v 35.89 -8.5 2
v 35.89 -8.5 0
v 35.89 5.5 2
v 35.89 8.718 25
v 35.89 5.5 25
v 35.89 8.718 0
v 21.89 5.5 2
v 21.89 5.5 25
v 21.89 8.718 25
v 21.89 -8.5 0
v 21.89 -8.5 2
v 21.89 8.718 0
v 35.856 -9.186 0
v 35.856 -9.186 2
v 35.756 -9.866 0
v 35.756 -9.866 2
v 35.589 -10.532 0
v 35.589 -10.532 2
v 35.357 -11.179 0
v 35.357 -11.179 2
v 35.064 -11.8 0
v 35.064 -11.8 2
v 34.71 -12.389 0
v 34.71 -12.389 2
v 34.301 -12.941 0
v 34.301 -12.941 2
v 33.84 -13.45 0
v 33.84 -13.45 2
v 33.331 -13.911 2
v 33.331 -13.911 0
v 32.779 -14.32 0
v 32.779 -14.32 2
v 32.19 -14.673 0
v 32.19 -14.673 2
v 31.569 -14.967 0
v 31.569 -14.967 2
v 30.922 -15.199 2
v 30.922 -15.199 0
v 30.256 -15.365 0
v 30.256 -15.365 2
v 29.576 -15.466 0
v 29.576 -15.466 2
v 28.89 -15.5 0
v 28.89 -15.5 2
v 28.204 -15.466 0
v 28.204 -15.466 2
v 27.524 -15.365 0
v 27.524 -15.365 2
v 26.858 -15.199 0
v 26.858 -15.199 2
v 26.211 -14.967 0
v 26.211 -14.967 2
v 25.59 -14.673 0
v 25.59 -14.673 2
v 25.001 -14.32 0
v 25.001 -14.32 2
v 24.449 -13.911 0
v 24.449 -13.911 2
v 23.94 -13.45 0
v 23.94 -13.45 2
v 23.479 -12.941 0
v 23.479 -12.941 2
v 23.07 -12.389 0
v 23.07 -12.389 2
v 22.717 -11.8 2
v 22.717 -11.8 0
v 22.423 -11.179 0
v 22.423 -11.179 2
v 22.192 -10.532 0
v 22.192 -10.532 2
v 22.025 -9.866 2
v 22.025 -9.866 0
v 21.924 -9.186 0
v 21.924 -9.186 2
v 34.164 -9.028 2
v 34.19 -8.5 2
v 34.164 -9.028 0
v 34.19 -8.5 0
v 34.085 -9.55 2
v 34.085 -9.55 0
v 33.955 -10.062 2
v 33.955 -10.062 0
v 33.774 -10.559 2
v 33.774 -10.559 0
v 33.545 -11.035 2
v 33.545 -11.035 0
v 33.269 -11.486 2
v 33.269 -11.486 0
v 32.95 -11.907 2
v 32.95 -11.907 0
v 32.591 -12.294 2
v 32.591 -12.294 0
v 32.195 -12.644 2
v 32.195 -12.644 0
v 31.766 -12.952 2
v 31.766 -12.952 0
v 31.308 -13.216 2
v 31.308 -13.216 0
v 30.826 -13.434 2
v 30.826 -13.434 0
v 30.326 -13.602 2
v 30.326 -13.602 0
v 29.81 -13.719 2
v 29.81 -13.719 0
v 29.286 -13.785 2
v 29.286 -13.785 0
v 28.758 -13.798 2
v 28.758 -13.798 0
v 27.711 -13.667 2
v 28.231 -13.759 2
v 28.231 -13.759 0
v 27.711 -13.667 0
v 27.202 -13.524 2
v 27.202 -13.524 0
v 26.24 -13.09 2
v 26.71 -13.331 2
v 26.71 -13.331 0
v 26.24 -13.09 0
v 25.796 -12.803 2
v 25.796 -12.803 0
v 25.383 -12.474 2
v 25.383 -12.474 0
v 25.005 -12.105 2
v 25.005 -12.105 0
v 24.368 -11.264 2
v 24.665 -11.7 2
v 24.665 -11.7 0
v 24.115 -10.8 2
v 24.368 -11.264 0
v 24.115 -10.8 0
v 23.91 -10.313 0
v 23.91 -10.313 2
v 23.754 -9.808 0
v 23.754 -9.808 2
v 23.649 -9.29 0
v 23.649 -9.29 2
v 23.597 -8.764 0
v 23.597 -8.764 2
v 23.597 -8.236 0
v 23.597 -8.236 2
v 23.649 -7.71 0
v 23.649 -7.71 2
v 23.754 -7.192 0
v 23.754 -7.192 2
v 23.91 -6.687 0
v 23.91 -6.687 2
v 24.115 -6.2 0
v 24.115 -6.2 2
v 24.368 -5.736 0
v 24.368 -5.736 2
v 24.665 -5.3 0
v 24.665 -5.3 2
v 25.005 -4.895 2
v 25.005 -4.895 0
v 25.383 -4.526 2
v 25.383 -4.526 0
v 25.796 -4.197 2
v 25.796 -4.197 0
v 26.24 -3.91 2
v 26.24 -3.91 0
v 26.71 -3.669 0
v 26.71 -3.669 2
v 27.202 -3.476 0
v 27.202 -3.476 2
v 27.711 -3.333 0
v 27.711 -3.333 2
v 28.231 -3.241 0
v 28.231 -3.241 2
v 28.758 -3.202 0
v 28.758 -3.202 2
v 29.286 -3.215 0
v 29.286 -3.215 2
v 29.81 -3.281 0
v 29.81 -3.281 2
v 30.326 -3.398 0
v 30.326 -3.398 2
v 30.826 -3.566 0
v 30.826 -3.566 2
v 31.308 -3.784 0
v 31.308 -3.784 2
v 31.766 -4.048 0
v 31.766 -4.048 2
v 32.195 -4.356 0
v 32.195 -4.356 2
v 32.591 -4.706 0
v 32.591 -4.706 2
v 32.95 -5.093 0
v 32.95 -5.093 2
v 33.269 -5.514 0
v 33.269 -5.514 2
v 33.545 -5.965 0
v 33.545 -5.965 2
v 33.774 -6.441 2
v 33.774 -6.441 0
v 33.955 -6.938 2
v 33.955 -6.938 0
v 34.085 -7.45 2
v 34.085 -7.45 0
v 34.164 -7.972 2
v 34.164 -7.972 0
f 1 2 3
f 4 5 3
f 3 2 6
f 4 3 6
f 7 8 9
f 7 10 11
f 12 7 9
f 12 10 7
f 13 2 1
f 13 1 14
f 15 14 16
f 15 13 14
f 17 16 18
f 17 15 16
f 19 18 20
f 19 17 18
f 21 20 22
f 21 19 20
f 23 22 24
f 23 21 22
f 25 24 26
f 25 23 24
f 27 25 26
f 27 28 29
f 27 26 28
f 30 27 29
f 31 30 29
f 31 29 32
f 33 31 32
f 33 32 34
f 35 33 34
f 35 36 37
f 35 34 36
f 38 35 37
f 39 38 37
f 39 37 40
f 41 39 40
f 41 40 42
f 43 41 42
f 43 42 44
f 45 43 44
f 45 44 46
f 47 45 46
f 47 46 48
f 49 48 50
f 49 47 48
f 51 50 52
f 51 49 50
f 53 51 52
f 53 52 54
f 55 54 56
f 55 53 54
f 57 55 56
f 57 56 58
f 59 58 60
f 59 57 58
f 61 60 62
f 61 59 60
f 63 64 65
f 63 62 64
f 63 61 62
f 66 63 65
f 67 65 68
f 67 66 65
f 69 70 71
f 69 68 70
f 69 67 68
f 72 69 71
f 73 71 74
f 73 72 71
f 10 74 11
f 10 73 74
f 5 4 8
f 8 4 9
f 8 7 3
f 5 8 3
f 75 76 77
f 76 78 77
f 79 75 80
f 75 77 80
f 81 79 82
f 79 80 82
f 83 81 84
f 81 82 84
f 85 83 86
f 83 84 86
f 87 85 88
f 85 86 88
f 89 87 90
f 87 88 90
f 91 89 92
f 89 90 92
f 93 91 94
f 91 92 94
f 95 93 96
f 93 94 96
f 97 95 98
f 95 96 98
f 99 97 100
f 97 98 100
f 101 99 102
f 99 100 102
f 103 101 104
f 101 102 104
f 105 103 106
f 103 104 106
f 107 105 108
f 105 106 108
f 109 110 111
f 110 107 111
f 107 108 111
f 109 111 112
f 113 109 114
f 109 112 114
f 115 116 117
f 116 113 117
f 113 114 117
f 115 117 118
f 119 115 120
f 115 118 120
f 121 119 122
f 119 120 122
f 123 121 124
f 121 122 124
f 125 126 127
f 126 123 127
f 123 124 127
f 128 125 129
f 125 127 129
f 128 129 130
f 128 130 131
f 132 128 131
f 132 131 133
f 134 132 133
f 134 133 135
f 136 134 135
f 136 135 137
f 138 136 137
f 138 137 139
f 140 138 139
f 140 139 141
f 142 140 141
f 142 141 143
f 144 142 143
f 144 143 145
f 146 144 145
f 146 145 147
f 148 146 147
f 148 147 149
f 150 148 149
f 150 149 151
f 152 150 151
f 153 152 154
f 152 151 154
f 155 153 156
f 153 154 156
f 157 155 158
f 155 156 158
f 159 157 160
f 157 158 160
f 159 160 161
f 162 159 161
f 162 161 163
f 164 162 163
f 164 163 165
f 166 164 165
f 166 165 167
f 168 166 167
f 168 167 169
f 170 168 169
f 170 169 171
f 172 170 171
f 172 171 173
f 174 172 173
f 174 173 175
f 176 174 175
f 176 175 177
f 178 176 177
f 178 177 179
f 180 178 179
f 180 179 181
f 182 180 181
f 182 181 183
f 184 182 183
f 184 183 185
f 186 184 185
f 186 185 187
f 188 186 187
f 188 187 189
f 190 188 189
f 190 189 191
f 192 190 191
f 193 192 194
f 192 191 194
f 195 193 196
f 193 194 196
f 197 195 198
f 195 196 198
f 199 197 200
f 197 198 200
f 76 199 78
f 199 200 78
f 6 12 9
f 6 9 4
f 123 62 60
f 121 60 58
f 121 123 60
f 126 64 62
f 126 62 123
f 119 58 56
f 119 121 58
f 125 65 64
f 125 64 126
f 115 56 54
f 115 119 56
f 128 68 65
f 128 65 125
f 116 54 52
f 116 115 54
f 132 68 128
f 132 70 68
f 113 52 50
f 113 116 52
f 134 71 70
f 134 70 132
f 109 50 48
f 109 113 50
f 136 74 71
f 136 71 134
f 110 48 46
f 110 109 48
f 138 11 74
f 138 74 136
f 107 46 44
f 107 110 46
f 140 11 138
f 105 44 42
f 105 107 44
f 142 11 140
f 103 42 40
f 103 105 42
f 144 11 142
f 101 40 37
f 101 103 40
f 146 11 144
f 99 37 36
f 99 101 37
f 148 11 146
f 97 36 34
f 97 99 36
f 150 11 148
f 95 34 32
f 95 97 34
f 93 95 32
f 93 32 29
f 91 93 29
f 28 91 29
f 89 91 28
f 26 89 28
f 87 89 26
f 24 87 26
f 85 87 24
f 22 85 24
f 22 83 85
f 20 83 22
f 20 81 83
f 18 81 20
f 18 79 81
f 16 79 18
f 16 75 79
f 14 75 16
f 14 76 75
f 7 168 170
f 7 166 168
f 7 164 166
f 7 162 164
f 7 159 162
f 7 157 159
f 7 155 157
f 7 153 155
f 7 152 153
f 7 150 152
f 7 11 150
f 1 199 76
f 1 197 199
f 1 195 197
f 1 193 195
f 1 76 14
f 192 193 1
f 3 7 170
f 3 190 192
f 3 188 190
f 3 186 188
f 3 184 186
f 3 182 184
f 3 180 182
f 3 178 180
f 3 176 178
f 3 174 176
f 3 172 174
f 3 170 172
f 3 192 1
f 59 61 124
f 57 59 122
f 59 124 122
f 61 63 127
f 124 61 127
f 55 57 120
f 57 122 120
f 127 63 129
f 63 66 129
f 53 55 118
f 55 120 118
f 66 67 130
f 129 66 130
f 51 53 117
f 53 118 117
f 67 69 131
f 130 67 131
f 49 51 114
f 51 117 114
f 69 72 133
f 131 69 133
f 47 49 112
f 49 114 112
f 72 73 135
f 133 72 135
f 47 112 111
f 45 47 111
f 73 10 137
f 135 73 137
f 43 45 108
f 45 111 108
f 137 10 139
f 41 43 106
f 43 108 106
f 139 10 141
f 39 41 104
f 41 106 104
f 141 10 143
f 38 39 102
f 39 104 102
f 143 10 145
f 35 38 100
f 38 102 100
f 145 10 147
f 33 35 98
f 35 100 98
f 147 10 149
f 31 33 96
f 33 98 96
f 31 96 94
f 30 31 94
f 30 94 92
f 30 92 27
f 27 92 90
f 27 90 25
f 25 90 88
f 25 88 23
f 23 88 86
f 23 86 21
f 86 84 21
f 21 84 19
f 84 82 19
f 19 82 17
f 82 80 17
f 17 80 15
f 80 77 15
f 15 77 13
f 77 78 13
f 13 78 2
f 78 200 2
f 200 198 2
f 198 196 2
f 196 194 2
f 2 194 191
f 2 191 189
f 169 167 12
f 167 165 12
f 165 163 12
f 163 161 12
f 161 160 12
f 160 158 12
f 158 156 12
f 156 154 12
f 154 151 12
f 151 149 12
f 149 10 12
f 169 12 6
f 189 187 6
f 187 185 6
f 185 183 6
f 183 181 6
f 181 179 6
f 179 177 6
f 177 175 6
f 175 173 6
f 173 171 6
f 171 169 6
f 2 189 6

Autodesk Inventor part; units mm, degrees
ref_plane "YZ Plane" through (0, 0, 0) normal (1, 0, 0) x (0, 1, 0)
ref_plane "XZ Plane" through (0, 0, 0) normal (0, 1, 0) x (-1, 0, 0)
ref_plane "XY Plane" through (0, 0, 0) normal (0, 0, 1) x (1, 0, 0)
ref_plane "작업 평면1" through (0, 0, 0) normal (0, 0, 1) x (1, 0, 0)
sketch "스케치1" plane through (0, 0, 0) normal (0, 0, 1) x (1, 0, 0)
  circle A0 centre (28.8901, -8.5) radius 5 projected
  circle A1 centre (28.8901, -8.5) radius 5.3
  circle A2 centre (28.8901, -8.5) radius 7
  line L0 (46.6099, 5.5) -> (-13.1099, 5.5) projected
  line L1 (46.6099, -16.5) -> (46.6099, 5.5) projected
  line L2 (35.8901, -8.5) -> (35.8901, 5.5)
  line L3 (21.8901, -8.5) -> (21.8901, 5.5)
  line L4 (35.8901, 5.5) -> (21.8901, 5.5)
  line L5 (21.8901, 5.5) -> (21.8901, 8.7184)
  line L6 (21.8901, 8.7184) -> (35.8901, 8.7184)
  line L7 (35.8901, 8.7184) -> (35.8901, 5.5)
  line L8 (21.8901, 5.5) -> (35.8901, 5.5)
  point P0 (0, 0)
  point P1 (21.8901, 5.5)
  dimension "d0" = 0.3
  dimension "d1" = 2
extrude "돌출1" add sketch "스케치1" along normal blind 2 contours A2 | A2 L3 L0 L2 | L0 L5 L6 L7
sketch "스케치2" plane through (0, 0, 0) normal (0, 0, -1) x (-1, 0, 0)
  line L0 (-21.8901, 8.7184) -> (-21.8901, -8.5) projected
  line L1 (-35.8901, 8.7184) -> (-21.8901, 8.7184) projected
  line L2 (-35.8901, -8.5) -> (-35.8901, 8.7184) projected
  line L3 (13.1099, 5.5) -> (-46.6099, 5.5) projected
  point P0 (0, 0)
  point P1 (-35.8901, 5.5)
  point P2 (-21.8901, 5.5)
extrude "돌출2" add sketch "스케치2" against normal blind 25
properties material "고무, 검은색"
